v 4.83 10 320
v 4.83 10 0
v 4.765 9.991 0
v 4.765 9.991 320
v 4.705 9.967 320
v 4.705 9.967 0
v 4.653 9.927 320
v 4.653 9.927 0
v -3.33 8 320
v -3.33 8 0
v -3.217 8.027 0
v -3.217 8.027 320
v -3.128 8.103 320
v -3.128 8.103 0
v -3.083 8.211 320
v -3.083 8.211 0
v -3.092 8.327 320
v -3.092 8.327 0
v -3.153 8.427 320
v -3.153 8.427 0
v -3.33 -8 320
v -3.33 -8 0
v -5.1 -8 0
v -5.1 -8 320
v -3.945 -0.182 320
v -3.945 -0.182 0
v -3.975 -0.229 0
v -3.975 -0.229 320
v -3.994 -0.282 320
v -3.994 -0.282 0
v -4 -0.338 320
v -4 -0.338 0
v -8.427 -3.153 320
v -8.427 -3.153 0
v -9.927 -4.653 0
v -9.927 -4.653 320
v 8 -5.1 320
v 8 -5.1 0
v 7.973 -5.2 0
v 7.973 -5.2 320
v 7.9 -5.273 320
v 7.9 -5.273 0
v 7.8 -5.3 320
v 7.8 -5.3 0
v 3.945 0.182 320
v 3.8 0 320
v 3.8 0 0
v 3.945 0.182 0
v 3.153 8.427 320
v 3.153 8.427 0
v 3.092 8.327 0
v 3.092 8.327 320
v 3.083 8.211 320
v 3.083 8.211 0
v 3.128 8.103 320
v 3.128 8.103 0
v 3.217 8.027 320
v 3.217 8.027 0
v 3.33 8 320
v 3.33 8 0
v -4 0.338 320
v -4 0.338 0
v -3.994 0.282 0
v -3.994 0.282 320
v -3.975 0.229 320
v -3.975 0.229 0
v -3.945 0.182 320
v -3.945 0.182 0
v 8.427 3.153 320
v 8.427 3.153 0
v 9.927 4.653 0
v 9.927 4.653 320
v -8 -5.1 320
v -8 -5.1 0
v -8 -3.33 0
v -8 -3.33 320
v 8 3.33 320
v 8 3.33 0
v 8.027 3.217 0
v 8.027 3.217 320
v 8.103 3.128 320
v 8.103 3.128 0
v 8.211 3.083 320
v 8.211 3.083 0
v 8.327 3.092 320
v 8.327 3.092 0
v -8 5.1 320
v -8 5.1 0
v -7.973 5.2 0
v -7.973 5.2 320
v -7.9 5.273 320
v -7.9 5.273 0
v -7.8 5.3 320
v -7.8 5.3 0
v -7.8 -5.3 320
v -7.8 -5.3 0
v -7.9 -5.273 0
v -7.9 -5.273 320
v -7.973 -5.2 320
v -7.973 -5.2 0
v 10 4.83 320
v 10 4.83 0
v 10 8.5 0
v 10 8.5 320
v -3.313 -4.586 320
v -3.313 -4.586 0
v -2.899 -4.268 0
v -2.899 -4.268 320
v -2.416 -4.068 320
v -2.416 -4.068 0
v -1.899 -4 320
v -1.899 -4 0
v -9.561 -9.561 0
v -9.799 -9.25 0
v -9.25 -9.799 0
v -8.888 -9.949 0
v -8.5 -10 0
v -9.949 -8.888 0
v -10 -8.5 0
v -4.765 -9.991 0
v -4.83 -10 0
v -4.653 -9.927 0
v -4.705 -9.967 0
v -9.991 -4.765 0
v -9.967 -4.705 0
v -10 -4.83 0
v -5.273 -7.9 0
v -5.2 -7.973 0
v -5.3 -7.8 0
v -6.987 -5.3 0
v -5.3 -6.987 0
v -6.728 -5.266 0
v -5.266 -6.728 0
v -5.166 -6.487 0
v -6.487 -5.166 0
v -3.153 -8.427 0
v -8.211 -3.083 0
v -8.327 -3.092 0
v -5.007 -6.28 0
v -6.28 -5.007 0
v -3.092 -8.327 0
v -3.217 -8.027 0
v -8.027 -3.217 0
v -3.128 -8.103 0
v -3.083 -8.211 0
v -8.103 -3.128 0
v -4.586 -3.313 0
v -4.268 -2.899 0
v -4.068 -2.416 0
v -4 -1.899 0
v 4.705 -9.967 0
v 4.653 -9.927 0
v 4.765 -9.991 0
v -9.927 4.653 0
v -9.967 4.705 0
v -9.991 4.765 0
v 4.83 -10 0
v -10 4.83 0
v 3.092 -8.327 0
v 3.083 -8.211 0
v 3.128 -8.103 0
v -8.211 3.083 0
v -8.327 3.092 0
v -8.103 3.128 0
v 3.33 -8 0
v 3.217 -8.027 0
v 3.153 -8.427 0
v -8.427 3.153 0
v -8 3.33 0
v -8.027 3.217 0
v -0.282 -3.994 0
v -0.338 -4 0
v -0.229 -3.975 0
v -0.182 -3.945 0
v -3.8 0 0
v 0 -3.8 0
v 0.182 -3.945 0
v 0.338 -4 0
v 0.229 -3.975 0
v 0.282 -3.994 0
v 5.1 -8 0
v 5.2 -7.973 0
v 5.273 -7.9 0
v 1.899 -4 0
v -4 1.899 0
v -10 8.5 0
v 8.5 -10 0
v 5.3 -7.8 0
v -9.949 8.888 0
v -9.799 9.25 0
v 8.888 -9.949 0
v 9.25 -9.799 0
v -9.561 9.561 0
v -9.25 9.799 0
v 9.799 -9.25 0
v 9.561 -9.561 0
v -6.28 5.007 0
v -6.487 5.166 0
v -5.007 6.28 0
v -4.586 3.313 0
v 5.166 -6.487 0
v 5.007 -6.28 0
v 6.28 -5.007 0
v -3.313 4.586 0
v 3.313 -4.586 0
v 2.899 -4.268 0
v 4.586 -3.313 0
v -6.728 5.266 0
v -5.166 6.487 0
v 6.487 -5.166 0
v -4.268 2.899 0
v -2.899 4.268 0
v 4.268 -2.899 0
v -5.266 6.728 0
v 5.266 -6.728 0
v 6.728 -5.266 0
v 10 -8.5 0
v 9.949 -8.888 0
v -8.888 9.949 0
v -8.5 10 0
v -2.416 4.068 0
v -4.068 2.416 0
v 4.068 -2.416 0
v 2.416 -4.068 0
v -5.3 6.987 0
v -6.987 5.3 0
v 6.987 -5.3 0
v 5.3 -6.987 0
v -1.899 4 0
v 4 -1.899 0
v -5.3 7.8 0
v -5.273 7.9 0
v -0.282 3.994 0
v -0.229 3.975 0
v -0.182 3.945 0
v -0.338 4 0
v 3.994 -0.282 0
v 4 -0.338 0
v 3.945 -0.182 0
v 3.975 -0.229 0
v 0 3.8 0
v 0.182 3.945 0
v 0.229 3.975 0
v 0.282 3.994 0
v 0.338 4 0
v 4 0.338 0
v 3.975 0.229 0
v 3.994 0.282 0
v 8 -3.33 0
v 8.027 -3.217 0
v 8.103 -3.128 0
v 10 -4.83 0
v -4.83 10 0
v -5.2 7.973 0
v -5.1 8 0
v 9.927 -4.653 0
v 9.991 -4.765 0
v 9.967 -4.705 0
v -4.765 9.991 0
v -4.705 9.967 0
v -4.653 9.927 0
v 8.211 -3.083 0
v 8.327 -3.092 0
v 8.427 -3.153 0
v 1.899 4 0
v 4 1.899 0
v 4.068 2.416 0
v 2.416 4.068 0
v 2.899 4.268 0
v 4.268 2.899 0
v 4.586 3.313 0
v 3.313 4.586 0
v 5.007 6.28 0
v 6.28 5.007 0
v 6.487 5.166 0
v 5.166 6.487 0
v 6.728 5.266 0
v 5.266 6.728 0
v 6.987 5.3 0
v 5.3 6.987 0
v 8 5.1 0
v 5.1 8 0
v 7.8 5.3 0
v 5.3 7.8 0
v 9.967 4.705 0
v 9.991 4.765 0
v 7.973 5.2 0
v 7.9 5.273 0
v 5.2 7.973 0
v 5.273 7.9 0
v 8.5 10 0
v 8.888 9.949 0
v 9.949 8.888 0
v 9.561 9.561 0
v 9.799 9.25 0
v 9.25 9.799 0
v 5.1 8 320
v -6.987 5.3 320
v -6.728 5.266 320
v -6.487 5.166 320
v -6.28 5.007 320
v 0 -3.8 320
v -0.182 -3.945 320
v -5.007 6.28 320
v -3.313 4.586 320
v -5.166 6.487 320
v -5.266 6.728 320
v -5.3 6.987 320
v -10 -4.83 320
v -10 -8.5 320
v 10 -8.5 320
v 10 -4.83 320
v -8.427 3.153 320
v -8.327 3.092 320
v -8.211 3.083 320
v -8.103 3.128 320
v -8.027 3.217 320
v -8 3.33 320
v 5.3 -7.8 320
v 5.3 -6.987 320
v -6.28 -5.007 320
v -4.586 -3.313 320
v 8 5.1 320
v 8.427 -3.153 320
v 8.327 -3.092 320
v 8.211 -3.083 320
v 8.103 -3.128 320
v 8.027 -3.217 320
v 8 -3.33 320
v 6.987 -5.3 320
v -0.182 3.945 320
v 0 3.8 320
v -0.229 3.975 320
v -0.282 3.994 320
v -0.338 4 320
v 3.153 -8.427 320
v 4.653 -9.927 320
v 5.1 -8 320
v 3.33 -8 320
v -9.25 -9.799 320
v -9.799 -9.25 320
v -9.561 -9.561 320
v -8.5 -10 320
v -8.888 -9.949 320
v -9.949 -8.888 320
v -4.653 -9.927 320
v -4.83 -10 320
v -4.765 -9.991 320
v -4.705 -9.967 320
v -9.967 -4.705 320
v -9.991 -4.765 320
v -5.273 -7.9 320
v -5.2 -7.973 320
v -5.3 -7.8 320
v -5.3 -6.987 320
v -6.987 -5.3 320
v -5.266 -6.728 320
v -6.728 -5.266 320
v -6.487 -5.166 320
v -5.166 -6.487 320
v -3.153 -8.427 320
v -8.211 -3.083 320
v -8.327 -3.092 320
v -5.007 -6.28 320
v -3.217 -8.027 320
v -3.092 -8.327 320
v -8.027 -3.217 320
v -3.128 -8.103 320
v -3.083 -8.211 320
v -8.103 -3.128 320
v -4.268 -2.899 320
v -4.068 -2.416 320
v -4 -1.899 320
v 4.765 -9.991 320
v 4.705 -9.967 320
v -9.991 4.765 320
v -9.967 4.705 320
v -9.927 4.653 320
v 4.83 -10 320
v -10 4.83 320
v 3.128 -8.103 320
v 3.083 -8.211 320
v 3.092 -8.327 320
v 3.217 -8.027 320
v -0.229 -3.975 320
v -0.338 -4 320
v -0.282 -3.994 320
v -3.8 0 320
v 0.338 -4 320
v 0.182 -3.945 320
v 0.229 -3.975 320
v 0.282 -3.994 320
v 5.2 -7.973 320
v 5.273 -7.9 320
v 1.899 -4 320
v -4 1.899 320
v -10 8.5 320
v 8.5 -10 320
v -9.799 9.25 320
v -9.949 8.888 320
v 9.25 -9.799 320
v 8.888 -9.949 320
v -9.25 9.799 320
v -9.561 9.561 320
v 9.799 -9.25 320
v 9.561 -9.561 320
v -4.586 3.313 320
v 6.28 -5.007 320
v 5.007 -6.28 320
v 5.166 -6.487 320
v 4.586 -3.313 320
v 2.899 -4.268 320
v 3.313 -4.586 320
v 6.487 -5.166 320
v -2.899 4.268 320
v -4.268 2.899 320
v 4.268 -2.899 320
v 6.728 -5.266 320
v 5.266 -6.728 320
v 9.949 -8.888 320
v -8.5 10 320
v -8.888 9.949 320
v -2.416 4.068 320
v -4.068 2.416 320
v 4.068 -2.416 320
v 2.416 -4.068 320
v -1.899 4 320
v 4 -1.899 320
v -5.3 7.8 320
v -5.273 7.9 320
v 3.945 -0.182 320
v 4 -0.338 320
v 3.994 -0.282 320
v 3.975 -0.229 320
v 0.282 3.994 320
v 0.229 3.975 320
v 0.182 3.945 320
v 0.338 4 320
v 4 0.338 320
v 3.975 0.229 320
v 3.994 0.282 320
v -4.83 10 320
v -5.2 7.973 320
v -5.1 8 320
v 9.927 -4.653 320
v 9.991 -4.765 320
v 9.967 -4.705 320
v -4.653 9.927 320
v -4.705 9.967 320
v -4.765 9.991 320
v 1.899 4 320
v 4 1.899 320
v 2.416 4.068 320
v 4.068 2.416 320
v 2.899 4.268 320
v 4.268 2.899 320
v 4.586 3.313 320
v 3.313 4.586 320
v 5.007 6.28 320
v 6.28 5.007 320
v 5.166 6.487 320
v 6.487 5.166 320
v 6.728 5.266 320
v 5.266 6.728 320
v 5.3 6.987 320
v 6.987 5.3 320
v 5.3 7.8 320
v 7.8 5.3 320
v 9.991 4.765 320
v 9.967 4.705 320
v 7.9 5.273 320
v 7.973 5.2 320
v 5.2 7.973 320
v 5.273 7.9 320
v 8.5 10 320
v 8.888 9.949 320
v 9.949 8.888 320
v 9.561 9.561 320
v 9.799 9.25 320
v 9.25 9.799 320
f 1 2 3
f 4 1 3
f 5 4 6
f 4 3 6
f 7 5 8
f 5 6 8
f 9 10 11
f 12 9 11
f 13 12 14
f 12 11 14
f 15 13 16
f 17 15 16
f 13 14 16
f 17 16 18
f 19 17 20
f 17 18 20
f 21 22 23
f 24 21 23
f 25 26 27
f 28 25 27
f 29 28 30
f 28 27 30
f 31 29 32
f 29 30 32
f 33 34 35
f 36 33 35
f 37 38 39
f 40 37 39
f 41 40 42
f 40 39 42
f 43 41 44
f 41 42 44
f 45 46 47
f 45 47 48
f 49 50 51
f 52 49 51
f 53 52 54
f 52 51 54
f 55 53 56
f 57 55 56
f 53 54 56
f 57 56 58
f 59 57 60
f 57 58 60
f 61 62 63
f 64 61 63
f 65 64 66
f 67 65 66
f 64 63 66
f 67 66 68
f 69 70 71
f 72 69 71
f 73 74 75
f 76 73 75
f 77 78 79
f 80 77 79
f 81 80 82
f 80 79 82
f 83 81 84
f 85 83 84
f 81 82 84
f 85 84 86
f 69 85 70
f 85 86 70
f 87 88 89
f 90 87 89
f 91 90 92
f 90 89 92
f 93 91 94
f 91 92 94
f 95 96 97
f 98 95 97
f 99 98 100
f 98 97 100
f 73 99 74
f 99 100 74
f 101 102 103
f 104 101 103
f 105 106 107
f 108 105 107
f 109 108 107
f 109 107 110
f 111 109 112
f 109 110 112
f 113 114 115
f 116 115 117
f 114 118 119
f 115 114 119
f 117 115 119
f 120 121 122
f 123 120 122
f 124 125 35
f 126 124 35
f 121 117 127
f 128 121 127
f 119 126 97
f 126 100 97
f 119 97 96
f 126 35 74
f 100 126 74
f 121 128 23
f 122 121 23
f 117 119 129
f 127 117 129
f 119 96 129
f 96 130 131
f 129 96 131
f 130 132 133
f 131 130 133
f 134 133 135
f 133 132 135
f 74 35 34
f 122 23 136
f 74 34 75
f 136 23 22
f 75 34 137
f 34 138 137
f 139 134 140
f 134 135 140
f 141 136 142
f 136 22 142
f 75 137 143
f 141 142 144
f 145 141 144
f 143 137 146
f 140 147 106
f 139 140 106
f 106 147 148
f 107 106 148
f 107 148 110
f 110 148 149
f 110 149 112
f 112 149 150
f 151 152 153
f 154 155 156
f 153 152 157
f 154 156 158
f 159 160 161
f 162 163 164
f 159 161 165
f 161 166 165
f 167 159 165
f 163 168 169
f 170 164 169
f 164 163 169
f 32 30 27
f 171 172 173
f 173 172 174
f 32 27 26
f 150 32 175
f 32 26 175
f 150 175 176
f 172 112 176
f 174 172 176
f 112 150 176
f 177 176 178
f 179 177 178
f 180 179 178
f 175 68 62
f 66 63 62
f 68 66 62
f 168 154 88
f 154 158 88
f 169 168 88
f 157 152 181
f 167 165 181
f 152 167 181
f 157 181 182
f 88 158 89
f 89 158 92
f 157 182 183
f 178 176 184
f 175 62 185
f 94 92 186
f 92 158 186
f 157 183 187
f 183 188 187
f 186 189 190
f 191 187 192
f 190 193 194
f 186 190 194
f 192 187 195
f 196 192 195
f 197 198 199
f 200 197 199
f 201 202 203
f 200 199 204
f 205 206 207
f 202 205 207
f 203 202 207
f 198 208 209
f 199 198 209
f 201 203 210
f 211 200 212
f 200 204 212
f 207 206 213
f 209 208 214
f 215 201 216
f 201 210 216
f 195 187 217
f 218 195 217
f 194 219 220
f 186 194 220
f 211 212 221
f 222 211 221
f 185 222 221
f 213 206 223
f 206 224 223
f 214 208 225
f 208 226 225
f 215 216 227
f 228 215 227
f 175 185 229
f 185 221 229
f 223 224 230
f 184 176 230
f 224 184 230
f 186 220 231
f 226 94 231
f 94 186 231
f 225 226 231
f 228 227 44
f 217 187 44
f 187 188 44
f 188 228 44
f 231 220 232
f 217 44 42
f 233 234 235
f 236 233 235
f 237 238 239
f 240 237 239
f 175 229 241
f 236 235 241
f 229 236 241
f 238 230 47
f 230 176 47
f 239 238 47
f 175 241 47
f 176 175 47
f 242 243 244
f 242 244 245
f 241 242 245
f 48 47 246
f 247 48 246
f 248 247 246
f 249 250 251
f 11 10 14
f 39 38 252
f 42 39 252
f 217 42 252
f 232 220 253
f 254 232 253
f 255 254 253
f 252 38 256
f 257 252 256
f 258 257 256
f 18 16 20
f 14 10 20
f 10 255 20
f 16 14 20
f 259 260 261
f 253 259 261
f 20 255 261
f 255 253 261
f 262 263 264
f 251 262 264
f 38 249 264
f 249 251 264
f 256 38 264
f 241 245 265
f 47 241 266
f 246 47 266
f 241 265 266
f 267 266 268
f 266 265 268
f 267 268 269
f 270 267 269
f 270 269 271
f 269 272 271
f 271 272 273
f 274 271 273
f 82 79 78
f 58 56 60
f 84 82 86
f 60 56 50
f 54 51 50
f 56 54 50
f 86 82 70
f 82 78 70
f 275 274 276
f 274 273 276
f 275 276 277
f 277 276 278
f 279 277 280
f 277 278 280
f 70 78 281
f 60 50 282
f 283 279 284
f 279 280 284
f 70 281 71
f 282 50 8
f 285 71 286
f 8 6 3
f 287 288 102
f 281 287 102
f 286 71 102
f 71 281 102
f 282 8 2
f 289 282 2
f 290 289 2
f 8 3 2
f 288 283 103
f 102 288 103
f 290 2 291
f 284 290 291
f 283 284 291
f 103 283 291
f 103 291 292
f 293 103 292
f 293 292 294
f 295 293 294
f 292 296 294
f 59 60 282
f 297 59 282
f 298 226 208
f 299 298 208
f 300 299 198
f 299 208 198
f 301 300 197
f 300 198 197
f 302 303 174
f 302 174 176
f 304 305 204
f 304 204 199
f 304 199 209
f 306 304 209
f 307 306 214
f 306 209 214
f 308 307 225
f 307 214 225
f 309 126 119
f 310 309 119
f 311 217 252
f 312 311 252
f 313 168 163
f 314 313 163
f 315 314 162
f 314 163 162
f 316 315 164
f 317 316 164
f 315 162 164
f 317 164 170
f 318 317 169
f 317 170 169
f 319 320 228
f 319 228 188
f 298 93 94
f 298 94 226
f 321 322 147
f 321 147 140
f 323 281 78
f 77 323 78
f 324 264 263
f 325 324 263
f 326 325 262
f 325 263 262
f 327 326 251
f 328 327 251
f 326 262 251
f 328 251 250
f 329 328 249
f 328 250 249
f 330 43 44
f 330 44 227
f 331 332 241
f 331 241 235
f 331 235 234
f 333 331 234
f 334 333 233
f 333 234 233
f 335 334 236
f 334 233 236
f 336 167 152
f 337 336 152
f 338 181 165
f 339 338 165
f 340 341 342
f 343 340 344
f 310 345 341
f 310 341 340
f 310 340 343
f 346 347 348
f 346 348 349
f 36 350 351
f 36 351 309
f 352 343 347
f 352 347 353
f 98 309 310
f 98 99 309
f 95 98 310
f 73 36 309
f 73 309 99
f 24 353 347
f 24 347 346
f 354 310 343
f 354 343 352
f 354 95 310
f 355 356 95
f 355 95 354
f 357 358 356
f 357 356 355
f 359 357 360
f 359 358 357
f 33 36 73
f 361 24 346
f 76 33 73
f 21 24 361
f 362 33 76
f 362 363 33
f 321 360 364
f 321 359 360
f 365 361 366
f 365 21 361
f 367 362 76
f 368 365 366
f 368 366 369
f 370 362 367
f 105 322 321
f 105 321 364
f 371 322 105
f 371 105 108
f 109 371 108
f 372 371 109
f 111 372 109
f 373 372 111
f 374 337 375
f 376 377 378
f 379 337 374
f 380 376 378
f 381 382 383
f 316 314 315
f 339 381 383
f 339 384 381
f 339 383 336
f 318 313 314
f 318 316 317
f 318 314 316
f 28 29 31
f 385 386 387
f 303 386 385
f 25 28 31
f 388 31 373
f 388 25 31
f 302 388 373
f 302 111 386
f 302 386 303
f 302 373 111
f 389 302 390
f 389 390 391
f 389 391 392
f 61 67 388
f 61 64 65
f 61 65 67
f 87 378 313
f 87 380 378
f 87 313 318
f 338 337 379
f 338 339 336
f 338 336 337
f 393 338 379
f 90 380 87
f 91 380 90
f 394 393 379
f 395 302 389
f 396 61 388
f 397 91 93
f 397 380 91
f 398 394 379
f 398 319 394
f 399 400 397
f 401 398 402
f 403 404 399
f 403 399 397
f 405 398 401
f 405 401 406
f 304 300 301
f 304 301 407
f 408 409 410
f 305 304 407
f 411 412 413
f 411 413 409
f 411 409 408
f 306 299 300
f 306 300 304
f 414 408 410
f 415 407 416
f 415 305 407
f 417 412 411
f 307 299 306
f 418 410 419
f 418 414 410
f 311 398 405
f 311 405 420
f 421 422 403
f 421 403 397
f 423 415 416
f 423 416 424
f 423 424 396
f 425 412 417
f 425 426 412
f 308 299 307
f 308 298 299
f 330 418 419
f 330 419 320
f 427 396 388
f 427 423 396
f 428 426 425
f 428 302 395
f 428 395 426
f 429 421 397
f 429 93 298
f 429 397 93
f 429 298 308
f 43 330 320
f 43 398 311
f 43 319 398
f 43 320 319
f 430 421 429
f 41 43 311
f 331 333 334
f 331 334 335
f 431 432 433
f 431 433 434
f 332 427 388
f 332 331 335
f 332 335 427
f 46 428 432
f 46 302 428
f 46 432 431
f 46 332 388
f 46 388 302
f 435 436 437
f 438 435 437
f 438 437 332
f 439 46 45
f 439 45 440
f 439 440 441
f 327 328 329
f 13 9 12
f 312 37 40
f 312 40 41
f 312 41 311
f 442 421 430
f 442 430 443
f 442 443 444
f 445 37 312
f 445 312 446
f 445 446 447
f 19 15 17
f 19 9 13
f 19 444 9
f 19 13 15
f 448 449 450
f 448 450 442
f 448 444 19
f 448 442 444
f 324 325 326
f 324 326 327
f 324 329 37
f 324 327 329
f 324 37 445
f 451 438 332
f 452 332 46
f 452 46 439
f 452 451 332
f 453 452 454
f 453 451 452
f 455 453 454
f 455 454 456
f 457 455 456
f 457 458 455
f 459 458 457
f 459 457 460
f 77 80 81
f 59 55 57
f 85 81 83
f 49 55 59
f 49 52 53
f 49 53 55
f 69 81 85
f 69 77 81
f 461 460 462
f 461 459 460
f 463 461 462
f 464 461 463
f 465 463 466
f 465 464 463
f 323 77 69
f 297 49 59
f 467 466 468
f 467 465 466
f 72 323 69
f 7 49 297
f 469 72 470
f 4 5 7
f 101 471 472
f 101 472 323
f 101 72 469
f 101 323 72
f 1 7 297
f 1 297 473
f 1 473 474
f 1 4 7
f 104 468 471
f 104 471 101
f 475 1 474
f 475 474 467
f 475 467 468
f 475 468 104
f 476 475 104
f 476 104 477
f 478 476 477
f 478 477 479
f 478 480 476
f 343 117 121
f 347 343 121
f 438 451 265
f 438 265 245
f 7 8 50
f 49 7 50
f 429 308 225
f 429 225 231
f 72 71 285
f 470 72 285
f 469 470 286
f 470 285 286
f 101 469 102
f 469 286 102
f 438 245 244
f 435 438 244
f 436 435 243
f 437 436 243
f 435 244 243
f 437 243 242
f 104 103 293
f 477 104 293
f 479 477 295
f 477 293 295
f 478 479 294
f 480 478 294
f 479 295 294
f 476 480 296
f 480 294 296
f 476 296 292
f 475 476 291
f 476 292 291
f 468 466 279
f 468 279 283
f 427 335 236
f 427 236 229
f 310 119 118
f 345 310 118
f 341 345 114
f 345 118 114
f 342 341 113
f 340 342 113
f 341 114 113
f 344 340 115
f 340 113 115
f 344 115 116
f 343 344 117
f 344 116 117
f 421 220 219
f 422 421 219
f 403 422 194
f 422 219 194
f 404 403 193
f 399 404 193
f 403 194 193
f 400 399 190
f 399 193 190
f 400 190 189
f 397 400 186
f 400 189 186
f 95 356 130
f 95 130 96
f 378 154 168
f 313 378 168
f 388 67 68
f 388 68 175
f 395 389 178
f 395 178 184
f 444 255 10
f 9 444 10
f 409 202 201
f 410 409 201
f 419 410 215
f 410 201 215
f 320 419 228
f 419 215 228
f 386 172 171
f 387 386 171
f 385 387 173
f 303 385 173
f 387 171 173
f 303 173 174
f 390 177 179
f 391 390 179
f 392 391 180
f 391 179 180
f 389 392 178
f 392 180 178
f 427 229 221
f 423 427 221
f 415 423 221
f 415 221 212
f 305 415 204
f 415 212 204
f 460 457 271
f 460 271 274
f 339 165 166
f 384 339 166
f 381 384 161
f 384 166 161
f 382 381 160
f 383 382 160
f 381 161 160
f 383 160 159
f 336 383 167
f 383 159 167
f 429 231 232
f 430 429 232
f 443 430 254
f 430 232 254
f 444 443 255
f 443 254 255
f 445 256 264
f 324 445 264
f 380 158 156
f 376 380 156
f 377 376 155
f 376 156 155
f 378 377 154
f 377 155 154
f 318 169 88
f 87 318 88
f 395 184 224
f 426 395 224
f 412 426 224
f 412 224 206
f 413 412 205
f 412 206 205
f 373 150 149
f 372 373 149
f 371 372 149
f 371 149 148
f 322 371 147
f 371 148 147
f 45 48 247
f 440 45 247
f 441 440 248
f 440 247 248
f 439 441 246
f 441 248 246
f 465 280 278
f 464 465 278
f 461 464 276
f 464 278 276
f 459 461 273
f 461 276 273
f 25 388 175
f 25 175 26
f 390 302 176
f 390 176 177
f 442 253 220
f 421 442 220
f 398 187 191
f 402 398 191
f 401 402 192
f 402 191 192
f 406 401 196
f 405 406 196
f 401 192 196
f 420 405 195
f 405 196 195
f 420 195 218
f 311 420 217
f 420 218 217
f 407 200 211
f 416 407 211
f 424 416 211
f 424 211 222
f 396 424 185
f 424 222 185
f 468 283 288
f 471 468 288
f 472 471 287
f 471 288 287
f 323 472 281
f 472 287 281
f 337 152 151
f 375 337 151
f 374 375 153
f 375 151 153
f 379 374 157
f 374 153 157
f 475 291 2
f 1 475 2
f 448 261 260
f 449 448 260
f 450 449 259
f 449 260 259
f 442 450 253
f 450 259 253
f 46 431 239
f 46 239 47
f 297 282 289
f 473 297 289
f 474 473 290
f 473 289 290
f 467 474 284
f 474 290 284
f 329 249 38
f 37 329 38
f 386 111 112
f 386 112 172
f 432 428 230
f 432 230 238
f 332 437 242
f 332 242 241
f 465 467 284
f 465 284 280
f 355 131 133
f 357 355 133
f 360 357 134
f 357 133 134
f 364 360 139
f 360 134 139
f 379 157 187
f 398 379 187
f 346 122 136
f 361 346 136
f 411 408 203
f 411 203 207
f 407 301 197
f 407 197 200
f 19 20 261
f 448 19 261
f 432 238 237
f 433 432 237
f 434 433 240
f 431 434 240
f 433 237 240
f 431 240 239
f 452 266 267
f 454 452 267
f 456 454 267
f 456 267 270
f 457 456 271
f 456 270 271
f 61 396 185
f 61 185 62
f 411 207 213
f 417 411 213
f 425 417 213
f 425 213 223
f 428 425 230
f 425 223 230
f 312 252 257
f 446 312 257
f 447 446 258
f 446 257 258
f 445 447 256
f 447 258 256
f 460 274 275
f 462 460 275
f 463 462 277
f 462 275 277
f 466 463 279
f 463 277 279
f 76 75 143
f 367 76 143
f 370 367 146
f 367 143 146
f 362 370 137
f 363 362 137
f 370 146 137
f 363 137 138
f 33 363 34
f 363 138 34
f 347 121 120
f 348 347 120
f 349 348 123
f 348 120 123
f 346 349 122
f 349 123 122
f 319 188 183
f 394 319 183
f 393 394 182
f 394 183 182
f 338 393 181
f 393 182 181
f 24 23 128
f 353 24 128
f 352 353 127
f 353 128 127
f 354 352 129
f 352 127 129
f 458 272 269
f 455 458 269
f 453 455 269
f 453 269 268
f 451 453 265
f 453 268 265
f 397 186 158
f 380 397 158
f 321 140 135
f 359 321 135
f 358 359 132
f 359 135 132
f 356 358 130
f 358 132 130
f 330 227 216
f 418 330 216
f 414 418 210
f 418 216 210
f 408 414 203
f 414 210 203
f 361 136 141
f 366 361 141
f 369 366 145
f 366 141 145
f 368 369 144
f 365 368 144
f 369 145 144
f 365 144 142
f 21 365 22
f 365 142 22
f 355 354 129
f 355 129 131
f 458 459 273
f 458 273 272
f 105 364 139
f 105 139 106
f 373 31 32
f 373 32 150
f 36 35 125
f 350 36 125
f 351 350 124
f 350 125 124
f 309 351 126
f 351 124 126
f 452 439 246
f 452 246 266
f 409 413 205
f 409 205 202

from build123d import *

# Parameters (mm, degrees)
EXTRUDE_1_DEPTH = 320


# Read off the part's stored shape, not the designer's step: 222 Конструкционный профиль 20х20-1-surface1
with BuildPart() as part:
    # Эскиз1 → Бобышка-Вытянуть1 (new body)
    with BuildSketch(Plane.XY):
        with BuildLine():
            Line((-3.945217202, 0.181521503), (-3.8, 0))
            Line((-3.8, 0), (-3.945217202, -0.181521503))
            ThreePointArc((-3.945217202, -0.181521503), (-3.98590708, -0.254943529), (-4, -0.337695265))
            Line((-4, -0.337695265), (-4, -1.898780669))
            ThreePointArc((-4, -1.898780669), (-4.152240935, -2.664147534), (-4.585786438, -3.312994231))
            Line((-4.585786438, -3.312994231), (-6.279898987, -5.007106781))
            ThreePointArc((-6.279898987, -5.007106781), (-6.604322336, -5.223879533), (-6.987005769, -5.3))
            Line((-6.987005769, -5.3), (-7.8, -5.3))
            ThreePointArc((-7.8, -5.3), (-7.941421356, -5.241421356), (-8, -5.1))
            Line((-8, -5.1), (-8, -3.33))
            ThreePointArc((-8, -3.33), (-8.154329142, -3.099030117), (-8.426776695, -3.153223305))
            Line((-8.426776695, -3.153223305), (-9.926776695, -4.653223305))
            ThreePointArc((-9.926776695, -4.653223305), (-9.980969883, -4.734329142), (-10, -4.83))
            Line((-10, -4.83), (-10, -8.5))
            ThreePointArc((-10, -8.5), (-9.560660172, -9.560660172), (-8.5, -10))
            Line((-8.5, -10), (-4.83, -10))
            ThreePointArc((-4.83, -10), (-4.734329142, -9.980969883), (-4.653223305, -9.926776695))
            Line((-4.653223305, -9.926776695), (-3.153223305, -8.426776695))
            ThreePointArc((-3.153223305, -8.426776695), (-3.099030117, -8.154329142), (-3.33, -8))
            Line((-3.33, -8), (-5.1, -8))
            ThreePointArc((-5.1, -8), (-5.241421356, -7.941421356), (-5.3, -7.8))
            Line((-5.3, -7.8), (-5.3, -6.987005769))
            ThreePointArc((-5.3, -6.987005769), (-5.223879533, -6.604322336), (-5.007106781, -6.279898987))
            Line((-5.007106781, -6.279898987), (-3.312994231, -4.585786438))
            ThreePointArc((-3.312994231, -4.585786438), (-2.664147534, -4.152240935), (-1.898780669, -4))
            Line((-1.898780669, -4), (-0.337695265, -4))
            ThreePointArc((-0.337695265, -4), (-0.254943529, -3.98590708), (-0.181521503, -3.945217202))
            Line((-0.181521503, -3.945217202), (0, -3.8))
            Line((0, -3.8), (0.181521503, -3.945217202))
            ThreePointArc((0.181521503, -3.945217202), (0.254943529, -3.98590708), (0.337695265, -4))
            Line((0.337695265, -4), (1.898780669, -4))
            ThreePointArc((1.898780669, -4), (2.664147534, -4.152240935), (3.312994231, -4.585786438))
            Line((3.312994231, -4.585786438), (5.007106781, -6.279898987))
            ThreePointArc((5.007106781, -6.279898987), (5.223879533, -6.604322336), (5.3, -6.987005769))
            Line((5.3, -6.987005769), (5.3, -7.8))
            ThreePointArc((5.3, -7.8), (5.241421356, -7.941421356), (5.1, -8))
            Line((5.1, -8), (3.33, -8))
            ThreePointArc((3.33, -8), (3.099030117, -8.154329142), (3.153223305, -8.426776695))
            Line((3.153223305, -8.426776695), (4.653223305, -9.926776695))
            ThreePointArc((4.653223305, -9.926776695), (4.734329142, -9.980969883), (4.83, -10))
            Line((4.83, -10), (8.5, -10))
            ThreePointArc((8.5, -10), (9.560660172, -9.560660172), (10, -8.5))
            Line((10, -8.5), (10, -4.83))
            ThreePointArc((10, -4.83), (9.980969883, -4.734329142), (9.926776695, -4.653223305))
            Line((9.926776695, -4.653223305), (8.426776695, -3.153223305))
            ThreePointArc((8.426776695, -3.153223305), (8.154329142, -3.099030117), (8, -3.33))
            Line((8, -3.33), (8, -5.1))
            ThreePointArc((8, -5.1), (7.941421356, -5.241421356), (7.8, -5.3))
            Line((7.8, -5.3), (6.987005769, -5.3))
            ThreePointArc((6.987005769, -5.3), (6.604322336, -5.223879533), (6.279898987, -5.007106781))
            Line((6.279898987, -5.007106781), (4.585786438, -3.312994231))
            ThreePointArc((4.585786438, -3.312994231), (4.152240935, -2.664147534), (4, -1.898780669))
            Line((4, -1.898780669), (4, -0.337695265))
            ThreePointArc((4, -0.337695265), (3.98590708, -0.254943529), (3.945217202, -0.181521503))
            Line((3.945217202, -0.181521503), (3.8, 0))
            Line((3.8, 0), (3.945217202, 0.181521503))
            ThreePointArc((3.945217202, 0.181521503), (3.98590708, 0.254943529), (4, 0.337695265))
            Line((4, 0.337695265), (4, 1.898780669))
            ThreePointArc((4, 1.898780669), (4.152240935, 2.664147534), (4.585786438, 3.312994231))
            Line((4.585786438, 3.312994231), (6.279898987, 5.007106781))
            ThreePointArc((6.279898987, 5.007106781), (6.604322336, 5.223879533), (6.987005769, 5.3))
            Line((6.987005769, 5.3), (7.8, 5.3))
            ThreePointArc((7.8, 5.3), (7.941421356, 5.241421356), (8, 5.1))
            Line((8, 5.1), (8, 3.33))
            ThreePointArc((8, 3.33), (8.154329142, 3.099030117), (8.426776695, 3.153223305))
            Line((8.426776695, 3.153223305), (9.926776695, 4.653223305))
            ThreePointArc((9.926776695, 4.653223305), (9.980969883, 4.734329142), (10, 4.83))
            Line((10, 4.83), (10, 8.5))
            ThreePointArc((10, 8.5), (9.560660172, 9.560660172), (8.5, 10))
            Line((8.5, 10), (4.83, 10))
            ThreePointArc((4.83, 10), (4.734329142, 9.980969883), (4.653223305, 9.926776695))
            Line((4.653223305, 9.926776695), (3.153223305, 8.426776695))
            ThreePointArc((3.153223305, 8.426776695), (3.099030117, 8.154329142), (3.33, 8))
            Line((3.33, 8), (5.1, 8))
            ThreePointArc((5.1, 8), (5.241421356, 7.941421356), (5.3, 7.8))
            Line((5.3, 7.8), (5.3, 6.987005769))
            ThreePointArc((5.3, 6.987005769), (5.223879533, 6.604322336), (5.007106781, 6.279898987))
            Line((5.007106781, 6.279898987), (3.312994231, 4.585786438))
            ThreePointArc((3.312994231, 4.585786438), (2.664147534, 4.152240935), (1.898780669, 4))
            Line((1.898780669, 4), (0.337695265, 4))
            ThreePointArc((0.337695265, 4), (0.254943529, 3.98590708), (0.181521503, 3.945217202))
            Line((0.181521503, 3.945217202), (0, 3.8))
            Line((0, 3.8), (-0.181521503, 3.945217202))
            ThreePointArc((-0.181521503, 3.945217202), (-0.254943529, 3.98590708), (-0.337695265, 4))
            Line((-0.337695265, 4), (-1.898780669, 4))
            ThreePointArc((-1.898780669, 4), (-2.664147534, 4.152240935), (-3.312994231, 4.585786438))
            Line((-3.312994231, 4.585786438), (-5.007106781, 6.279898987))
            ThreePointArc((-5.007106781, 6.279898987), (-5.223879533, 6.604322336), (-5.3, 6.987005769))
            Line((-5.3, 6.987005769), (-5.3, 7.8))
            ThreePointArc((-5.3, 7.8), (-5.241421356, 7.941421356), (-5.1, 8))
            Line((-5.1, 8), (-3.33, 8))
            ThreePointArc((-3.33, 8), (-3.099030117, 8.154329142), (-3.153223305, 8.426776695))
            Line((-3.153223305, 8.426776695), (-4.653223305, 9.926776695))
            ThreePointArc((-4.653223305, 9.926776695), (-4.734329142, 9.980969883), (-4.83, 10))
            Line((-4.83, 10), (-8.5, 10))
            ThreePointArc((-8.5, 10), (-9.560660172, 9.560660172), (-10, 8.5))
            Line((-10, 8.5), (-10, 4.83))
            ThreePointArc((-10, 4.83), (-9.980969883, 4.734329142), (-9.926776695, 4.653223305))
            Line((-9.926776695, 4.653223305), (-8.426776695, 3.153223305))
            ThreePointArc((-8.426776695, 3.153223305), (-8.154329142, 3.099030117), (-8, 3.33))
            Line((-8, 3.33), (-8, 5.1))
            ThreePointArc((-8, 5.1), (-7.941421356, 5.241421356), (-7.8, 5.3))
            Line((-7.8, 5.3), (-6.987005769, 5.3))
            ThreePointArc((-6.987005769, 5.3), (-6.604322336, 5.223879533), (-6.279898987, 5.007106781))
            Line((-6.279898987, 5.007106781), (-4.585786438, 3.312994231))
            ThreePointArc((-4.585786438, 3.312994231), (-4.152240935, 2.664147534), (-4, 1.898780669))
            Line((-4, 1.898780669), (-4, 0.337695265))
            ThreePointArc((-4, 0.337695265), (-3.98590708, 0.254943529), (-3.945217202, 0.181521503))
        make_face()
    extrude(amount=EXTRUDE_1_DEPTH)


solid = part.part
